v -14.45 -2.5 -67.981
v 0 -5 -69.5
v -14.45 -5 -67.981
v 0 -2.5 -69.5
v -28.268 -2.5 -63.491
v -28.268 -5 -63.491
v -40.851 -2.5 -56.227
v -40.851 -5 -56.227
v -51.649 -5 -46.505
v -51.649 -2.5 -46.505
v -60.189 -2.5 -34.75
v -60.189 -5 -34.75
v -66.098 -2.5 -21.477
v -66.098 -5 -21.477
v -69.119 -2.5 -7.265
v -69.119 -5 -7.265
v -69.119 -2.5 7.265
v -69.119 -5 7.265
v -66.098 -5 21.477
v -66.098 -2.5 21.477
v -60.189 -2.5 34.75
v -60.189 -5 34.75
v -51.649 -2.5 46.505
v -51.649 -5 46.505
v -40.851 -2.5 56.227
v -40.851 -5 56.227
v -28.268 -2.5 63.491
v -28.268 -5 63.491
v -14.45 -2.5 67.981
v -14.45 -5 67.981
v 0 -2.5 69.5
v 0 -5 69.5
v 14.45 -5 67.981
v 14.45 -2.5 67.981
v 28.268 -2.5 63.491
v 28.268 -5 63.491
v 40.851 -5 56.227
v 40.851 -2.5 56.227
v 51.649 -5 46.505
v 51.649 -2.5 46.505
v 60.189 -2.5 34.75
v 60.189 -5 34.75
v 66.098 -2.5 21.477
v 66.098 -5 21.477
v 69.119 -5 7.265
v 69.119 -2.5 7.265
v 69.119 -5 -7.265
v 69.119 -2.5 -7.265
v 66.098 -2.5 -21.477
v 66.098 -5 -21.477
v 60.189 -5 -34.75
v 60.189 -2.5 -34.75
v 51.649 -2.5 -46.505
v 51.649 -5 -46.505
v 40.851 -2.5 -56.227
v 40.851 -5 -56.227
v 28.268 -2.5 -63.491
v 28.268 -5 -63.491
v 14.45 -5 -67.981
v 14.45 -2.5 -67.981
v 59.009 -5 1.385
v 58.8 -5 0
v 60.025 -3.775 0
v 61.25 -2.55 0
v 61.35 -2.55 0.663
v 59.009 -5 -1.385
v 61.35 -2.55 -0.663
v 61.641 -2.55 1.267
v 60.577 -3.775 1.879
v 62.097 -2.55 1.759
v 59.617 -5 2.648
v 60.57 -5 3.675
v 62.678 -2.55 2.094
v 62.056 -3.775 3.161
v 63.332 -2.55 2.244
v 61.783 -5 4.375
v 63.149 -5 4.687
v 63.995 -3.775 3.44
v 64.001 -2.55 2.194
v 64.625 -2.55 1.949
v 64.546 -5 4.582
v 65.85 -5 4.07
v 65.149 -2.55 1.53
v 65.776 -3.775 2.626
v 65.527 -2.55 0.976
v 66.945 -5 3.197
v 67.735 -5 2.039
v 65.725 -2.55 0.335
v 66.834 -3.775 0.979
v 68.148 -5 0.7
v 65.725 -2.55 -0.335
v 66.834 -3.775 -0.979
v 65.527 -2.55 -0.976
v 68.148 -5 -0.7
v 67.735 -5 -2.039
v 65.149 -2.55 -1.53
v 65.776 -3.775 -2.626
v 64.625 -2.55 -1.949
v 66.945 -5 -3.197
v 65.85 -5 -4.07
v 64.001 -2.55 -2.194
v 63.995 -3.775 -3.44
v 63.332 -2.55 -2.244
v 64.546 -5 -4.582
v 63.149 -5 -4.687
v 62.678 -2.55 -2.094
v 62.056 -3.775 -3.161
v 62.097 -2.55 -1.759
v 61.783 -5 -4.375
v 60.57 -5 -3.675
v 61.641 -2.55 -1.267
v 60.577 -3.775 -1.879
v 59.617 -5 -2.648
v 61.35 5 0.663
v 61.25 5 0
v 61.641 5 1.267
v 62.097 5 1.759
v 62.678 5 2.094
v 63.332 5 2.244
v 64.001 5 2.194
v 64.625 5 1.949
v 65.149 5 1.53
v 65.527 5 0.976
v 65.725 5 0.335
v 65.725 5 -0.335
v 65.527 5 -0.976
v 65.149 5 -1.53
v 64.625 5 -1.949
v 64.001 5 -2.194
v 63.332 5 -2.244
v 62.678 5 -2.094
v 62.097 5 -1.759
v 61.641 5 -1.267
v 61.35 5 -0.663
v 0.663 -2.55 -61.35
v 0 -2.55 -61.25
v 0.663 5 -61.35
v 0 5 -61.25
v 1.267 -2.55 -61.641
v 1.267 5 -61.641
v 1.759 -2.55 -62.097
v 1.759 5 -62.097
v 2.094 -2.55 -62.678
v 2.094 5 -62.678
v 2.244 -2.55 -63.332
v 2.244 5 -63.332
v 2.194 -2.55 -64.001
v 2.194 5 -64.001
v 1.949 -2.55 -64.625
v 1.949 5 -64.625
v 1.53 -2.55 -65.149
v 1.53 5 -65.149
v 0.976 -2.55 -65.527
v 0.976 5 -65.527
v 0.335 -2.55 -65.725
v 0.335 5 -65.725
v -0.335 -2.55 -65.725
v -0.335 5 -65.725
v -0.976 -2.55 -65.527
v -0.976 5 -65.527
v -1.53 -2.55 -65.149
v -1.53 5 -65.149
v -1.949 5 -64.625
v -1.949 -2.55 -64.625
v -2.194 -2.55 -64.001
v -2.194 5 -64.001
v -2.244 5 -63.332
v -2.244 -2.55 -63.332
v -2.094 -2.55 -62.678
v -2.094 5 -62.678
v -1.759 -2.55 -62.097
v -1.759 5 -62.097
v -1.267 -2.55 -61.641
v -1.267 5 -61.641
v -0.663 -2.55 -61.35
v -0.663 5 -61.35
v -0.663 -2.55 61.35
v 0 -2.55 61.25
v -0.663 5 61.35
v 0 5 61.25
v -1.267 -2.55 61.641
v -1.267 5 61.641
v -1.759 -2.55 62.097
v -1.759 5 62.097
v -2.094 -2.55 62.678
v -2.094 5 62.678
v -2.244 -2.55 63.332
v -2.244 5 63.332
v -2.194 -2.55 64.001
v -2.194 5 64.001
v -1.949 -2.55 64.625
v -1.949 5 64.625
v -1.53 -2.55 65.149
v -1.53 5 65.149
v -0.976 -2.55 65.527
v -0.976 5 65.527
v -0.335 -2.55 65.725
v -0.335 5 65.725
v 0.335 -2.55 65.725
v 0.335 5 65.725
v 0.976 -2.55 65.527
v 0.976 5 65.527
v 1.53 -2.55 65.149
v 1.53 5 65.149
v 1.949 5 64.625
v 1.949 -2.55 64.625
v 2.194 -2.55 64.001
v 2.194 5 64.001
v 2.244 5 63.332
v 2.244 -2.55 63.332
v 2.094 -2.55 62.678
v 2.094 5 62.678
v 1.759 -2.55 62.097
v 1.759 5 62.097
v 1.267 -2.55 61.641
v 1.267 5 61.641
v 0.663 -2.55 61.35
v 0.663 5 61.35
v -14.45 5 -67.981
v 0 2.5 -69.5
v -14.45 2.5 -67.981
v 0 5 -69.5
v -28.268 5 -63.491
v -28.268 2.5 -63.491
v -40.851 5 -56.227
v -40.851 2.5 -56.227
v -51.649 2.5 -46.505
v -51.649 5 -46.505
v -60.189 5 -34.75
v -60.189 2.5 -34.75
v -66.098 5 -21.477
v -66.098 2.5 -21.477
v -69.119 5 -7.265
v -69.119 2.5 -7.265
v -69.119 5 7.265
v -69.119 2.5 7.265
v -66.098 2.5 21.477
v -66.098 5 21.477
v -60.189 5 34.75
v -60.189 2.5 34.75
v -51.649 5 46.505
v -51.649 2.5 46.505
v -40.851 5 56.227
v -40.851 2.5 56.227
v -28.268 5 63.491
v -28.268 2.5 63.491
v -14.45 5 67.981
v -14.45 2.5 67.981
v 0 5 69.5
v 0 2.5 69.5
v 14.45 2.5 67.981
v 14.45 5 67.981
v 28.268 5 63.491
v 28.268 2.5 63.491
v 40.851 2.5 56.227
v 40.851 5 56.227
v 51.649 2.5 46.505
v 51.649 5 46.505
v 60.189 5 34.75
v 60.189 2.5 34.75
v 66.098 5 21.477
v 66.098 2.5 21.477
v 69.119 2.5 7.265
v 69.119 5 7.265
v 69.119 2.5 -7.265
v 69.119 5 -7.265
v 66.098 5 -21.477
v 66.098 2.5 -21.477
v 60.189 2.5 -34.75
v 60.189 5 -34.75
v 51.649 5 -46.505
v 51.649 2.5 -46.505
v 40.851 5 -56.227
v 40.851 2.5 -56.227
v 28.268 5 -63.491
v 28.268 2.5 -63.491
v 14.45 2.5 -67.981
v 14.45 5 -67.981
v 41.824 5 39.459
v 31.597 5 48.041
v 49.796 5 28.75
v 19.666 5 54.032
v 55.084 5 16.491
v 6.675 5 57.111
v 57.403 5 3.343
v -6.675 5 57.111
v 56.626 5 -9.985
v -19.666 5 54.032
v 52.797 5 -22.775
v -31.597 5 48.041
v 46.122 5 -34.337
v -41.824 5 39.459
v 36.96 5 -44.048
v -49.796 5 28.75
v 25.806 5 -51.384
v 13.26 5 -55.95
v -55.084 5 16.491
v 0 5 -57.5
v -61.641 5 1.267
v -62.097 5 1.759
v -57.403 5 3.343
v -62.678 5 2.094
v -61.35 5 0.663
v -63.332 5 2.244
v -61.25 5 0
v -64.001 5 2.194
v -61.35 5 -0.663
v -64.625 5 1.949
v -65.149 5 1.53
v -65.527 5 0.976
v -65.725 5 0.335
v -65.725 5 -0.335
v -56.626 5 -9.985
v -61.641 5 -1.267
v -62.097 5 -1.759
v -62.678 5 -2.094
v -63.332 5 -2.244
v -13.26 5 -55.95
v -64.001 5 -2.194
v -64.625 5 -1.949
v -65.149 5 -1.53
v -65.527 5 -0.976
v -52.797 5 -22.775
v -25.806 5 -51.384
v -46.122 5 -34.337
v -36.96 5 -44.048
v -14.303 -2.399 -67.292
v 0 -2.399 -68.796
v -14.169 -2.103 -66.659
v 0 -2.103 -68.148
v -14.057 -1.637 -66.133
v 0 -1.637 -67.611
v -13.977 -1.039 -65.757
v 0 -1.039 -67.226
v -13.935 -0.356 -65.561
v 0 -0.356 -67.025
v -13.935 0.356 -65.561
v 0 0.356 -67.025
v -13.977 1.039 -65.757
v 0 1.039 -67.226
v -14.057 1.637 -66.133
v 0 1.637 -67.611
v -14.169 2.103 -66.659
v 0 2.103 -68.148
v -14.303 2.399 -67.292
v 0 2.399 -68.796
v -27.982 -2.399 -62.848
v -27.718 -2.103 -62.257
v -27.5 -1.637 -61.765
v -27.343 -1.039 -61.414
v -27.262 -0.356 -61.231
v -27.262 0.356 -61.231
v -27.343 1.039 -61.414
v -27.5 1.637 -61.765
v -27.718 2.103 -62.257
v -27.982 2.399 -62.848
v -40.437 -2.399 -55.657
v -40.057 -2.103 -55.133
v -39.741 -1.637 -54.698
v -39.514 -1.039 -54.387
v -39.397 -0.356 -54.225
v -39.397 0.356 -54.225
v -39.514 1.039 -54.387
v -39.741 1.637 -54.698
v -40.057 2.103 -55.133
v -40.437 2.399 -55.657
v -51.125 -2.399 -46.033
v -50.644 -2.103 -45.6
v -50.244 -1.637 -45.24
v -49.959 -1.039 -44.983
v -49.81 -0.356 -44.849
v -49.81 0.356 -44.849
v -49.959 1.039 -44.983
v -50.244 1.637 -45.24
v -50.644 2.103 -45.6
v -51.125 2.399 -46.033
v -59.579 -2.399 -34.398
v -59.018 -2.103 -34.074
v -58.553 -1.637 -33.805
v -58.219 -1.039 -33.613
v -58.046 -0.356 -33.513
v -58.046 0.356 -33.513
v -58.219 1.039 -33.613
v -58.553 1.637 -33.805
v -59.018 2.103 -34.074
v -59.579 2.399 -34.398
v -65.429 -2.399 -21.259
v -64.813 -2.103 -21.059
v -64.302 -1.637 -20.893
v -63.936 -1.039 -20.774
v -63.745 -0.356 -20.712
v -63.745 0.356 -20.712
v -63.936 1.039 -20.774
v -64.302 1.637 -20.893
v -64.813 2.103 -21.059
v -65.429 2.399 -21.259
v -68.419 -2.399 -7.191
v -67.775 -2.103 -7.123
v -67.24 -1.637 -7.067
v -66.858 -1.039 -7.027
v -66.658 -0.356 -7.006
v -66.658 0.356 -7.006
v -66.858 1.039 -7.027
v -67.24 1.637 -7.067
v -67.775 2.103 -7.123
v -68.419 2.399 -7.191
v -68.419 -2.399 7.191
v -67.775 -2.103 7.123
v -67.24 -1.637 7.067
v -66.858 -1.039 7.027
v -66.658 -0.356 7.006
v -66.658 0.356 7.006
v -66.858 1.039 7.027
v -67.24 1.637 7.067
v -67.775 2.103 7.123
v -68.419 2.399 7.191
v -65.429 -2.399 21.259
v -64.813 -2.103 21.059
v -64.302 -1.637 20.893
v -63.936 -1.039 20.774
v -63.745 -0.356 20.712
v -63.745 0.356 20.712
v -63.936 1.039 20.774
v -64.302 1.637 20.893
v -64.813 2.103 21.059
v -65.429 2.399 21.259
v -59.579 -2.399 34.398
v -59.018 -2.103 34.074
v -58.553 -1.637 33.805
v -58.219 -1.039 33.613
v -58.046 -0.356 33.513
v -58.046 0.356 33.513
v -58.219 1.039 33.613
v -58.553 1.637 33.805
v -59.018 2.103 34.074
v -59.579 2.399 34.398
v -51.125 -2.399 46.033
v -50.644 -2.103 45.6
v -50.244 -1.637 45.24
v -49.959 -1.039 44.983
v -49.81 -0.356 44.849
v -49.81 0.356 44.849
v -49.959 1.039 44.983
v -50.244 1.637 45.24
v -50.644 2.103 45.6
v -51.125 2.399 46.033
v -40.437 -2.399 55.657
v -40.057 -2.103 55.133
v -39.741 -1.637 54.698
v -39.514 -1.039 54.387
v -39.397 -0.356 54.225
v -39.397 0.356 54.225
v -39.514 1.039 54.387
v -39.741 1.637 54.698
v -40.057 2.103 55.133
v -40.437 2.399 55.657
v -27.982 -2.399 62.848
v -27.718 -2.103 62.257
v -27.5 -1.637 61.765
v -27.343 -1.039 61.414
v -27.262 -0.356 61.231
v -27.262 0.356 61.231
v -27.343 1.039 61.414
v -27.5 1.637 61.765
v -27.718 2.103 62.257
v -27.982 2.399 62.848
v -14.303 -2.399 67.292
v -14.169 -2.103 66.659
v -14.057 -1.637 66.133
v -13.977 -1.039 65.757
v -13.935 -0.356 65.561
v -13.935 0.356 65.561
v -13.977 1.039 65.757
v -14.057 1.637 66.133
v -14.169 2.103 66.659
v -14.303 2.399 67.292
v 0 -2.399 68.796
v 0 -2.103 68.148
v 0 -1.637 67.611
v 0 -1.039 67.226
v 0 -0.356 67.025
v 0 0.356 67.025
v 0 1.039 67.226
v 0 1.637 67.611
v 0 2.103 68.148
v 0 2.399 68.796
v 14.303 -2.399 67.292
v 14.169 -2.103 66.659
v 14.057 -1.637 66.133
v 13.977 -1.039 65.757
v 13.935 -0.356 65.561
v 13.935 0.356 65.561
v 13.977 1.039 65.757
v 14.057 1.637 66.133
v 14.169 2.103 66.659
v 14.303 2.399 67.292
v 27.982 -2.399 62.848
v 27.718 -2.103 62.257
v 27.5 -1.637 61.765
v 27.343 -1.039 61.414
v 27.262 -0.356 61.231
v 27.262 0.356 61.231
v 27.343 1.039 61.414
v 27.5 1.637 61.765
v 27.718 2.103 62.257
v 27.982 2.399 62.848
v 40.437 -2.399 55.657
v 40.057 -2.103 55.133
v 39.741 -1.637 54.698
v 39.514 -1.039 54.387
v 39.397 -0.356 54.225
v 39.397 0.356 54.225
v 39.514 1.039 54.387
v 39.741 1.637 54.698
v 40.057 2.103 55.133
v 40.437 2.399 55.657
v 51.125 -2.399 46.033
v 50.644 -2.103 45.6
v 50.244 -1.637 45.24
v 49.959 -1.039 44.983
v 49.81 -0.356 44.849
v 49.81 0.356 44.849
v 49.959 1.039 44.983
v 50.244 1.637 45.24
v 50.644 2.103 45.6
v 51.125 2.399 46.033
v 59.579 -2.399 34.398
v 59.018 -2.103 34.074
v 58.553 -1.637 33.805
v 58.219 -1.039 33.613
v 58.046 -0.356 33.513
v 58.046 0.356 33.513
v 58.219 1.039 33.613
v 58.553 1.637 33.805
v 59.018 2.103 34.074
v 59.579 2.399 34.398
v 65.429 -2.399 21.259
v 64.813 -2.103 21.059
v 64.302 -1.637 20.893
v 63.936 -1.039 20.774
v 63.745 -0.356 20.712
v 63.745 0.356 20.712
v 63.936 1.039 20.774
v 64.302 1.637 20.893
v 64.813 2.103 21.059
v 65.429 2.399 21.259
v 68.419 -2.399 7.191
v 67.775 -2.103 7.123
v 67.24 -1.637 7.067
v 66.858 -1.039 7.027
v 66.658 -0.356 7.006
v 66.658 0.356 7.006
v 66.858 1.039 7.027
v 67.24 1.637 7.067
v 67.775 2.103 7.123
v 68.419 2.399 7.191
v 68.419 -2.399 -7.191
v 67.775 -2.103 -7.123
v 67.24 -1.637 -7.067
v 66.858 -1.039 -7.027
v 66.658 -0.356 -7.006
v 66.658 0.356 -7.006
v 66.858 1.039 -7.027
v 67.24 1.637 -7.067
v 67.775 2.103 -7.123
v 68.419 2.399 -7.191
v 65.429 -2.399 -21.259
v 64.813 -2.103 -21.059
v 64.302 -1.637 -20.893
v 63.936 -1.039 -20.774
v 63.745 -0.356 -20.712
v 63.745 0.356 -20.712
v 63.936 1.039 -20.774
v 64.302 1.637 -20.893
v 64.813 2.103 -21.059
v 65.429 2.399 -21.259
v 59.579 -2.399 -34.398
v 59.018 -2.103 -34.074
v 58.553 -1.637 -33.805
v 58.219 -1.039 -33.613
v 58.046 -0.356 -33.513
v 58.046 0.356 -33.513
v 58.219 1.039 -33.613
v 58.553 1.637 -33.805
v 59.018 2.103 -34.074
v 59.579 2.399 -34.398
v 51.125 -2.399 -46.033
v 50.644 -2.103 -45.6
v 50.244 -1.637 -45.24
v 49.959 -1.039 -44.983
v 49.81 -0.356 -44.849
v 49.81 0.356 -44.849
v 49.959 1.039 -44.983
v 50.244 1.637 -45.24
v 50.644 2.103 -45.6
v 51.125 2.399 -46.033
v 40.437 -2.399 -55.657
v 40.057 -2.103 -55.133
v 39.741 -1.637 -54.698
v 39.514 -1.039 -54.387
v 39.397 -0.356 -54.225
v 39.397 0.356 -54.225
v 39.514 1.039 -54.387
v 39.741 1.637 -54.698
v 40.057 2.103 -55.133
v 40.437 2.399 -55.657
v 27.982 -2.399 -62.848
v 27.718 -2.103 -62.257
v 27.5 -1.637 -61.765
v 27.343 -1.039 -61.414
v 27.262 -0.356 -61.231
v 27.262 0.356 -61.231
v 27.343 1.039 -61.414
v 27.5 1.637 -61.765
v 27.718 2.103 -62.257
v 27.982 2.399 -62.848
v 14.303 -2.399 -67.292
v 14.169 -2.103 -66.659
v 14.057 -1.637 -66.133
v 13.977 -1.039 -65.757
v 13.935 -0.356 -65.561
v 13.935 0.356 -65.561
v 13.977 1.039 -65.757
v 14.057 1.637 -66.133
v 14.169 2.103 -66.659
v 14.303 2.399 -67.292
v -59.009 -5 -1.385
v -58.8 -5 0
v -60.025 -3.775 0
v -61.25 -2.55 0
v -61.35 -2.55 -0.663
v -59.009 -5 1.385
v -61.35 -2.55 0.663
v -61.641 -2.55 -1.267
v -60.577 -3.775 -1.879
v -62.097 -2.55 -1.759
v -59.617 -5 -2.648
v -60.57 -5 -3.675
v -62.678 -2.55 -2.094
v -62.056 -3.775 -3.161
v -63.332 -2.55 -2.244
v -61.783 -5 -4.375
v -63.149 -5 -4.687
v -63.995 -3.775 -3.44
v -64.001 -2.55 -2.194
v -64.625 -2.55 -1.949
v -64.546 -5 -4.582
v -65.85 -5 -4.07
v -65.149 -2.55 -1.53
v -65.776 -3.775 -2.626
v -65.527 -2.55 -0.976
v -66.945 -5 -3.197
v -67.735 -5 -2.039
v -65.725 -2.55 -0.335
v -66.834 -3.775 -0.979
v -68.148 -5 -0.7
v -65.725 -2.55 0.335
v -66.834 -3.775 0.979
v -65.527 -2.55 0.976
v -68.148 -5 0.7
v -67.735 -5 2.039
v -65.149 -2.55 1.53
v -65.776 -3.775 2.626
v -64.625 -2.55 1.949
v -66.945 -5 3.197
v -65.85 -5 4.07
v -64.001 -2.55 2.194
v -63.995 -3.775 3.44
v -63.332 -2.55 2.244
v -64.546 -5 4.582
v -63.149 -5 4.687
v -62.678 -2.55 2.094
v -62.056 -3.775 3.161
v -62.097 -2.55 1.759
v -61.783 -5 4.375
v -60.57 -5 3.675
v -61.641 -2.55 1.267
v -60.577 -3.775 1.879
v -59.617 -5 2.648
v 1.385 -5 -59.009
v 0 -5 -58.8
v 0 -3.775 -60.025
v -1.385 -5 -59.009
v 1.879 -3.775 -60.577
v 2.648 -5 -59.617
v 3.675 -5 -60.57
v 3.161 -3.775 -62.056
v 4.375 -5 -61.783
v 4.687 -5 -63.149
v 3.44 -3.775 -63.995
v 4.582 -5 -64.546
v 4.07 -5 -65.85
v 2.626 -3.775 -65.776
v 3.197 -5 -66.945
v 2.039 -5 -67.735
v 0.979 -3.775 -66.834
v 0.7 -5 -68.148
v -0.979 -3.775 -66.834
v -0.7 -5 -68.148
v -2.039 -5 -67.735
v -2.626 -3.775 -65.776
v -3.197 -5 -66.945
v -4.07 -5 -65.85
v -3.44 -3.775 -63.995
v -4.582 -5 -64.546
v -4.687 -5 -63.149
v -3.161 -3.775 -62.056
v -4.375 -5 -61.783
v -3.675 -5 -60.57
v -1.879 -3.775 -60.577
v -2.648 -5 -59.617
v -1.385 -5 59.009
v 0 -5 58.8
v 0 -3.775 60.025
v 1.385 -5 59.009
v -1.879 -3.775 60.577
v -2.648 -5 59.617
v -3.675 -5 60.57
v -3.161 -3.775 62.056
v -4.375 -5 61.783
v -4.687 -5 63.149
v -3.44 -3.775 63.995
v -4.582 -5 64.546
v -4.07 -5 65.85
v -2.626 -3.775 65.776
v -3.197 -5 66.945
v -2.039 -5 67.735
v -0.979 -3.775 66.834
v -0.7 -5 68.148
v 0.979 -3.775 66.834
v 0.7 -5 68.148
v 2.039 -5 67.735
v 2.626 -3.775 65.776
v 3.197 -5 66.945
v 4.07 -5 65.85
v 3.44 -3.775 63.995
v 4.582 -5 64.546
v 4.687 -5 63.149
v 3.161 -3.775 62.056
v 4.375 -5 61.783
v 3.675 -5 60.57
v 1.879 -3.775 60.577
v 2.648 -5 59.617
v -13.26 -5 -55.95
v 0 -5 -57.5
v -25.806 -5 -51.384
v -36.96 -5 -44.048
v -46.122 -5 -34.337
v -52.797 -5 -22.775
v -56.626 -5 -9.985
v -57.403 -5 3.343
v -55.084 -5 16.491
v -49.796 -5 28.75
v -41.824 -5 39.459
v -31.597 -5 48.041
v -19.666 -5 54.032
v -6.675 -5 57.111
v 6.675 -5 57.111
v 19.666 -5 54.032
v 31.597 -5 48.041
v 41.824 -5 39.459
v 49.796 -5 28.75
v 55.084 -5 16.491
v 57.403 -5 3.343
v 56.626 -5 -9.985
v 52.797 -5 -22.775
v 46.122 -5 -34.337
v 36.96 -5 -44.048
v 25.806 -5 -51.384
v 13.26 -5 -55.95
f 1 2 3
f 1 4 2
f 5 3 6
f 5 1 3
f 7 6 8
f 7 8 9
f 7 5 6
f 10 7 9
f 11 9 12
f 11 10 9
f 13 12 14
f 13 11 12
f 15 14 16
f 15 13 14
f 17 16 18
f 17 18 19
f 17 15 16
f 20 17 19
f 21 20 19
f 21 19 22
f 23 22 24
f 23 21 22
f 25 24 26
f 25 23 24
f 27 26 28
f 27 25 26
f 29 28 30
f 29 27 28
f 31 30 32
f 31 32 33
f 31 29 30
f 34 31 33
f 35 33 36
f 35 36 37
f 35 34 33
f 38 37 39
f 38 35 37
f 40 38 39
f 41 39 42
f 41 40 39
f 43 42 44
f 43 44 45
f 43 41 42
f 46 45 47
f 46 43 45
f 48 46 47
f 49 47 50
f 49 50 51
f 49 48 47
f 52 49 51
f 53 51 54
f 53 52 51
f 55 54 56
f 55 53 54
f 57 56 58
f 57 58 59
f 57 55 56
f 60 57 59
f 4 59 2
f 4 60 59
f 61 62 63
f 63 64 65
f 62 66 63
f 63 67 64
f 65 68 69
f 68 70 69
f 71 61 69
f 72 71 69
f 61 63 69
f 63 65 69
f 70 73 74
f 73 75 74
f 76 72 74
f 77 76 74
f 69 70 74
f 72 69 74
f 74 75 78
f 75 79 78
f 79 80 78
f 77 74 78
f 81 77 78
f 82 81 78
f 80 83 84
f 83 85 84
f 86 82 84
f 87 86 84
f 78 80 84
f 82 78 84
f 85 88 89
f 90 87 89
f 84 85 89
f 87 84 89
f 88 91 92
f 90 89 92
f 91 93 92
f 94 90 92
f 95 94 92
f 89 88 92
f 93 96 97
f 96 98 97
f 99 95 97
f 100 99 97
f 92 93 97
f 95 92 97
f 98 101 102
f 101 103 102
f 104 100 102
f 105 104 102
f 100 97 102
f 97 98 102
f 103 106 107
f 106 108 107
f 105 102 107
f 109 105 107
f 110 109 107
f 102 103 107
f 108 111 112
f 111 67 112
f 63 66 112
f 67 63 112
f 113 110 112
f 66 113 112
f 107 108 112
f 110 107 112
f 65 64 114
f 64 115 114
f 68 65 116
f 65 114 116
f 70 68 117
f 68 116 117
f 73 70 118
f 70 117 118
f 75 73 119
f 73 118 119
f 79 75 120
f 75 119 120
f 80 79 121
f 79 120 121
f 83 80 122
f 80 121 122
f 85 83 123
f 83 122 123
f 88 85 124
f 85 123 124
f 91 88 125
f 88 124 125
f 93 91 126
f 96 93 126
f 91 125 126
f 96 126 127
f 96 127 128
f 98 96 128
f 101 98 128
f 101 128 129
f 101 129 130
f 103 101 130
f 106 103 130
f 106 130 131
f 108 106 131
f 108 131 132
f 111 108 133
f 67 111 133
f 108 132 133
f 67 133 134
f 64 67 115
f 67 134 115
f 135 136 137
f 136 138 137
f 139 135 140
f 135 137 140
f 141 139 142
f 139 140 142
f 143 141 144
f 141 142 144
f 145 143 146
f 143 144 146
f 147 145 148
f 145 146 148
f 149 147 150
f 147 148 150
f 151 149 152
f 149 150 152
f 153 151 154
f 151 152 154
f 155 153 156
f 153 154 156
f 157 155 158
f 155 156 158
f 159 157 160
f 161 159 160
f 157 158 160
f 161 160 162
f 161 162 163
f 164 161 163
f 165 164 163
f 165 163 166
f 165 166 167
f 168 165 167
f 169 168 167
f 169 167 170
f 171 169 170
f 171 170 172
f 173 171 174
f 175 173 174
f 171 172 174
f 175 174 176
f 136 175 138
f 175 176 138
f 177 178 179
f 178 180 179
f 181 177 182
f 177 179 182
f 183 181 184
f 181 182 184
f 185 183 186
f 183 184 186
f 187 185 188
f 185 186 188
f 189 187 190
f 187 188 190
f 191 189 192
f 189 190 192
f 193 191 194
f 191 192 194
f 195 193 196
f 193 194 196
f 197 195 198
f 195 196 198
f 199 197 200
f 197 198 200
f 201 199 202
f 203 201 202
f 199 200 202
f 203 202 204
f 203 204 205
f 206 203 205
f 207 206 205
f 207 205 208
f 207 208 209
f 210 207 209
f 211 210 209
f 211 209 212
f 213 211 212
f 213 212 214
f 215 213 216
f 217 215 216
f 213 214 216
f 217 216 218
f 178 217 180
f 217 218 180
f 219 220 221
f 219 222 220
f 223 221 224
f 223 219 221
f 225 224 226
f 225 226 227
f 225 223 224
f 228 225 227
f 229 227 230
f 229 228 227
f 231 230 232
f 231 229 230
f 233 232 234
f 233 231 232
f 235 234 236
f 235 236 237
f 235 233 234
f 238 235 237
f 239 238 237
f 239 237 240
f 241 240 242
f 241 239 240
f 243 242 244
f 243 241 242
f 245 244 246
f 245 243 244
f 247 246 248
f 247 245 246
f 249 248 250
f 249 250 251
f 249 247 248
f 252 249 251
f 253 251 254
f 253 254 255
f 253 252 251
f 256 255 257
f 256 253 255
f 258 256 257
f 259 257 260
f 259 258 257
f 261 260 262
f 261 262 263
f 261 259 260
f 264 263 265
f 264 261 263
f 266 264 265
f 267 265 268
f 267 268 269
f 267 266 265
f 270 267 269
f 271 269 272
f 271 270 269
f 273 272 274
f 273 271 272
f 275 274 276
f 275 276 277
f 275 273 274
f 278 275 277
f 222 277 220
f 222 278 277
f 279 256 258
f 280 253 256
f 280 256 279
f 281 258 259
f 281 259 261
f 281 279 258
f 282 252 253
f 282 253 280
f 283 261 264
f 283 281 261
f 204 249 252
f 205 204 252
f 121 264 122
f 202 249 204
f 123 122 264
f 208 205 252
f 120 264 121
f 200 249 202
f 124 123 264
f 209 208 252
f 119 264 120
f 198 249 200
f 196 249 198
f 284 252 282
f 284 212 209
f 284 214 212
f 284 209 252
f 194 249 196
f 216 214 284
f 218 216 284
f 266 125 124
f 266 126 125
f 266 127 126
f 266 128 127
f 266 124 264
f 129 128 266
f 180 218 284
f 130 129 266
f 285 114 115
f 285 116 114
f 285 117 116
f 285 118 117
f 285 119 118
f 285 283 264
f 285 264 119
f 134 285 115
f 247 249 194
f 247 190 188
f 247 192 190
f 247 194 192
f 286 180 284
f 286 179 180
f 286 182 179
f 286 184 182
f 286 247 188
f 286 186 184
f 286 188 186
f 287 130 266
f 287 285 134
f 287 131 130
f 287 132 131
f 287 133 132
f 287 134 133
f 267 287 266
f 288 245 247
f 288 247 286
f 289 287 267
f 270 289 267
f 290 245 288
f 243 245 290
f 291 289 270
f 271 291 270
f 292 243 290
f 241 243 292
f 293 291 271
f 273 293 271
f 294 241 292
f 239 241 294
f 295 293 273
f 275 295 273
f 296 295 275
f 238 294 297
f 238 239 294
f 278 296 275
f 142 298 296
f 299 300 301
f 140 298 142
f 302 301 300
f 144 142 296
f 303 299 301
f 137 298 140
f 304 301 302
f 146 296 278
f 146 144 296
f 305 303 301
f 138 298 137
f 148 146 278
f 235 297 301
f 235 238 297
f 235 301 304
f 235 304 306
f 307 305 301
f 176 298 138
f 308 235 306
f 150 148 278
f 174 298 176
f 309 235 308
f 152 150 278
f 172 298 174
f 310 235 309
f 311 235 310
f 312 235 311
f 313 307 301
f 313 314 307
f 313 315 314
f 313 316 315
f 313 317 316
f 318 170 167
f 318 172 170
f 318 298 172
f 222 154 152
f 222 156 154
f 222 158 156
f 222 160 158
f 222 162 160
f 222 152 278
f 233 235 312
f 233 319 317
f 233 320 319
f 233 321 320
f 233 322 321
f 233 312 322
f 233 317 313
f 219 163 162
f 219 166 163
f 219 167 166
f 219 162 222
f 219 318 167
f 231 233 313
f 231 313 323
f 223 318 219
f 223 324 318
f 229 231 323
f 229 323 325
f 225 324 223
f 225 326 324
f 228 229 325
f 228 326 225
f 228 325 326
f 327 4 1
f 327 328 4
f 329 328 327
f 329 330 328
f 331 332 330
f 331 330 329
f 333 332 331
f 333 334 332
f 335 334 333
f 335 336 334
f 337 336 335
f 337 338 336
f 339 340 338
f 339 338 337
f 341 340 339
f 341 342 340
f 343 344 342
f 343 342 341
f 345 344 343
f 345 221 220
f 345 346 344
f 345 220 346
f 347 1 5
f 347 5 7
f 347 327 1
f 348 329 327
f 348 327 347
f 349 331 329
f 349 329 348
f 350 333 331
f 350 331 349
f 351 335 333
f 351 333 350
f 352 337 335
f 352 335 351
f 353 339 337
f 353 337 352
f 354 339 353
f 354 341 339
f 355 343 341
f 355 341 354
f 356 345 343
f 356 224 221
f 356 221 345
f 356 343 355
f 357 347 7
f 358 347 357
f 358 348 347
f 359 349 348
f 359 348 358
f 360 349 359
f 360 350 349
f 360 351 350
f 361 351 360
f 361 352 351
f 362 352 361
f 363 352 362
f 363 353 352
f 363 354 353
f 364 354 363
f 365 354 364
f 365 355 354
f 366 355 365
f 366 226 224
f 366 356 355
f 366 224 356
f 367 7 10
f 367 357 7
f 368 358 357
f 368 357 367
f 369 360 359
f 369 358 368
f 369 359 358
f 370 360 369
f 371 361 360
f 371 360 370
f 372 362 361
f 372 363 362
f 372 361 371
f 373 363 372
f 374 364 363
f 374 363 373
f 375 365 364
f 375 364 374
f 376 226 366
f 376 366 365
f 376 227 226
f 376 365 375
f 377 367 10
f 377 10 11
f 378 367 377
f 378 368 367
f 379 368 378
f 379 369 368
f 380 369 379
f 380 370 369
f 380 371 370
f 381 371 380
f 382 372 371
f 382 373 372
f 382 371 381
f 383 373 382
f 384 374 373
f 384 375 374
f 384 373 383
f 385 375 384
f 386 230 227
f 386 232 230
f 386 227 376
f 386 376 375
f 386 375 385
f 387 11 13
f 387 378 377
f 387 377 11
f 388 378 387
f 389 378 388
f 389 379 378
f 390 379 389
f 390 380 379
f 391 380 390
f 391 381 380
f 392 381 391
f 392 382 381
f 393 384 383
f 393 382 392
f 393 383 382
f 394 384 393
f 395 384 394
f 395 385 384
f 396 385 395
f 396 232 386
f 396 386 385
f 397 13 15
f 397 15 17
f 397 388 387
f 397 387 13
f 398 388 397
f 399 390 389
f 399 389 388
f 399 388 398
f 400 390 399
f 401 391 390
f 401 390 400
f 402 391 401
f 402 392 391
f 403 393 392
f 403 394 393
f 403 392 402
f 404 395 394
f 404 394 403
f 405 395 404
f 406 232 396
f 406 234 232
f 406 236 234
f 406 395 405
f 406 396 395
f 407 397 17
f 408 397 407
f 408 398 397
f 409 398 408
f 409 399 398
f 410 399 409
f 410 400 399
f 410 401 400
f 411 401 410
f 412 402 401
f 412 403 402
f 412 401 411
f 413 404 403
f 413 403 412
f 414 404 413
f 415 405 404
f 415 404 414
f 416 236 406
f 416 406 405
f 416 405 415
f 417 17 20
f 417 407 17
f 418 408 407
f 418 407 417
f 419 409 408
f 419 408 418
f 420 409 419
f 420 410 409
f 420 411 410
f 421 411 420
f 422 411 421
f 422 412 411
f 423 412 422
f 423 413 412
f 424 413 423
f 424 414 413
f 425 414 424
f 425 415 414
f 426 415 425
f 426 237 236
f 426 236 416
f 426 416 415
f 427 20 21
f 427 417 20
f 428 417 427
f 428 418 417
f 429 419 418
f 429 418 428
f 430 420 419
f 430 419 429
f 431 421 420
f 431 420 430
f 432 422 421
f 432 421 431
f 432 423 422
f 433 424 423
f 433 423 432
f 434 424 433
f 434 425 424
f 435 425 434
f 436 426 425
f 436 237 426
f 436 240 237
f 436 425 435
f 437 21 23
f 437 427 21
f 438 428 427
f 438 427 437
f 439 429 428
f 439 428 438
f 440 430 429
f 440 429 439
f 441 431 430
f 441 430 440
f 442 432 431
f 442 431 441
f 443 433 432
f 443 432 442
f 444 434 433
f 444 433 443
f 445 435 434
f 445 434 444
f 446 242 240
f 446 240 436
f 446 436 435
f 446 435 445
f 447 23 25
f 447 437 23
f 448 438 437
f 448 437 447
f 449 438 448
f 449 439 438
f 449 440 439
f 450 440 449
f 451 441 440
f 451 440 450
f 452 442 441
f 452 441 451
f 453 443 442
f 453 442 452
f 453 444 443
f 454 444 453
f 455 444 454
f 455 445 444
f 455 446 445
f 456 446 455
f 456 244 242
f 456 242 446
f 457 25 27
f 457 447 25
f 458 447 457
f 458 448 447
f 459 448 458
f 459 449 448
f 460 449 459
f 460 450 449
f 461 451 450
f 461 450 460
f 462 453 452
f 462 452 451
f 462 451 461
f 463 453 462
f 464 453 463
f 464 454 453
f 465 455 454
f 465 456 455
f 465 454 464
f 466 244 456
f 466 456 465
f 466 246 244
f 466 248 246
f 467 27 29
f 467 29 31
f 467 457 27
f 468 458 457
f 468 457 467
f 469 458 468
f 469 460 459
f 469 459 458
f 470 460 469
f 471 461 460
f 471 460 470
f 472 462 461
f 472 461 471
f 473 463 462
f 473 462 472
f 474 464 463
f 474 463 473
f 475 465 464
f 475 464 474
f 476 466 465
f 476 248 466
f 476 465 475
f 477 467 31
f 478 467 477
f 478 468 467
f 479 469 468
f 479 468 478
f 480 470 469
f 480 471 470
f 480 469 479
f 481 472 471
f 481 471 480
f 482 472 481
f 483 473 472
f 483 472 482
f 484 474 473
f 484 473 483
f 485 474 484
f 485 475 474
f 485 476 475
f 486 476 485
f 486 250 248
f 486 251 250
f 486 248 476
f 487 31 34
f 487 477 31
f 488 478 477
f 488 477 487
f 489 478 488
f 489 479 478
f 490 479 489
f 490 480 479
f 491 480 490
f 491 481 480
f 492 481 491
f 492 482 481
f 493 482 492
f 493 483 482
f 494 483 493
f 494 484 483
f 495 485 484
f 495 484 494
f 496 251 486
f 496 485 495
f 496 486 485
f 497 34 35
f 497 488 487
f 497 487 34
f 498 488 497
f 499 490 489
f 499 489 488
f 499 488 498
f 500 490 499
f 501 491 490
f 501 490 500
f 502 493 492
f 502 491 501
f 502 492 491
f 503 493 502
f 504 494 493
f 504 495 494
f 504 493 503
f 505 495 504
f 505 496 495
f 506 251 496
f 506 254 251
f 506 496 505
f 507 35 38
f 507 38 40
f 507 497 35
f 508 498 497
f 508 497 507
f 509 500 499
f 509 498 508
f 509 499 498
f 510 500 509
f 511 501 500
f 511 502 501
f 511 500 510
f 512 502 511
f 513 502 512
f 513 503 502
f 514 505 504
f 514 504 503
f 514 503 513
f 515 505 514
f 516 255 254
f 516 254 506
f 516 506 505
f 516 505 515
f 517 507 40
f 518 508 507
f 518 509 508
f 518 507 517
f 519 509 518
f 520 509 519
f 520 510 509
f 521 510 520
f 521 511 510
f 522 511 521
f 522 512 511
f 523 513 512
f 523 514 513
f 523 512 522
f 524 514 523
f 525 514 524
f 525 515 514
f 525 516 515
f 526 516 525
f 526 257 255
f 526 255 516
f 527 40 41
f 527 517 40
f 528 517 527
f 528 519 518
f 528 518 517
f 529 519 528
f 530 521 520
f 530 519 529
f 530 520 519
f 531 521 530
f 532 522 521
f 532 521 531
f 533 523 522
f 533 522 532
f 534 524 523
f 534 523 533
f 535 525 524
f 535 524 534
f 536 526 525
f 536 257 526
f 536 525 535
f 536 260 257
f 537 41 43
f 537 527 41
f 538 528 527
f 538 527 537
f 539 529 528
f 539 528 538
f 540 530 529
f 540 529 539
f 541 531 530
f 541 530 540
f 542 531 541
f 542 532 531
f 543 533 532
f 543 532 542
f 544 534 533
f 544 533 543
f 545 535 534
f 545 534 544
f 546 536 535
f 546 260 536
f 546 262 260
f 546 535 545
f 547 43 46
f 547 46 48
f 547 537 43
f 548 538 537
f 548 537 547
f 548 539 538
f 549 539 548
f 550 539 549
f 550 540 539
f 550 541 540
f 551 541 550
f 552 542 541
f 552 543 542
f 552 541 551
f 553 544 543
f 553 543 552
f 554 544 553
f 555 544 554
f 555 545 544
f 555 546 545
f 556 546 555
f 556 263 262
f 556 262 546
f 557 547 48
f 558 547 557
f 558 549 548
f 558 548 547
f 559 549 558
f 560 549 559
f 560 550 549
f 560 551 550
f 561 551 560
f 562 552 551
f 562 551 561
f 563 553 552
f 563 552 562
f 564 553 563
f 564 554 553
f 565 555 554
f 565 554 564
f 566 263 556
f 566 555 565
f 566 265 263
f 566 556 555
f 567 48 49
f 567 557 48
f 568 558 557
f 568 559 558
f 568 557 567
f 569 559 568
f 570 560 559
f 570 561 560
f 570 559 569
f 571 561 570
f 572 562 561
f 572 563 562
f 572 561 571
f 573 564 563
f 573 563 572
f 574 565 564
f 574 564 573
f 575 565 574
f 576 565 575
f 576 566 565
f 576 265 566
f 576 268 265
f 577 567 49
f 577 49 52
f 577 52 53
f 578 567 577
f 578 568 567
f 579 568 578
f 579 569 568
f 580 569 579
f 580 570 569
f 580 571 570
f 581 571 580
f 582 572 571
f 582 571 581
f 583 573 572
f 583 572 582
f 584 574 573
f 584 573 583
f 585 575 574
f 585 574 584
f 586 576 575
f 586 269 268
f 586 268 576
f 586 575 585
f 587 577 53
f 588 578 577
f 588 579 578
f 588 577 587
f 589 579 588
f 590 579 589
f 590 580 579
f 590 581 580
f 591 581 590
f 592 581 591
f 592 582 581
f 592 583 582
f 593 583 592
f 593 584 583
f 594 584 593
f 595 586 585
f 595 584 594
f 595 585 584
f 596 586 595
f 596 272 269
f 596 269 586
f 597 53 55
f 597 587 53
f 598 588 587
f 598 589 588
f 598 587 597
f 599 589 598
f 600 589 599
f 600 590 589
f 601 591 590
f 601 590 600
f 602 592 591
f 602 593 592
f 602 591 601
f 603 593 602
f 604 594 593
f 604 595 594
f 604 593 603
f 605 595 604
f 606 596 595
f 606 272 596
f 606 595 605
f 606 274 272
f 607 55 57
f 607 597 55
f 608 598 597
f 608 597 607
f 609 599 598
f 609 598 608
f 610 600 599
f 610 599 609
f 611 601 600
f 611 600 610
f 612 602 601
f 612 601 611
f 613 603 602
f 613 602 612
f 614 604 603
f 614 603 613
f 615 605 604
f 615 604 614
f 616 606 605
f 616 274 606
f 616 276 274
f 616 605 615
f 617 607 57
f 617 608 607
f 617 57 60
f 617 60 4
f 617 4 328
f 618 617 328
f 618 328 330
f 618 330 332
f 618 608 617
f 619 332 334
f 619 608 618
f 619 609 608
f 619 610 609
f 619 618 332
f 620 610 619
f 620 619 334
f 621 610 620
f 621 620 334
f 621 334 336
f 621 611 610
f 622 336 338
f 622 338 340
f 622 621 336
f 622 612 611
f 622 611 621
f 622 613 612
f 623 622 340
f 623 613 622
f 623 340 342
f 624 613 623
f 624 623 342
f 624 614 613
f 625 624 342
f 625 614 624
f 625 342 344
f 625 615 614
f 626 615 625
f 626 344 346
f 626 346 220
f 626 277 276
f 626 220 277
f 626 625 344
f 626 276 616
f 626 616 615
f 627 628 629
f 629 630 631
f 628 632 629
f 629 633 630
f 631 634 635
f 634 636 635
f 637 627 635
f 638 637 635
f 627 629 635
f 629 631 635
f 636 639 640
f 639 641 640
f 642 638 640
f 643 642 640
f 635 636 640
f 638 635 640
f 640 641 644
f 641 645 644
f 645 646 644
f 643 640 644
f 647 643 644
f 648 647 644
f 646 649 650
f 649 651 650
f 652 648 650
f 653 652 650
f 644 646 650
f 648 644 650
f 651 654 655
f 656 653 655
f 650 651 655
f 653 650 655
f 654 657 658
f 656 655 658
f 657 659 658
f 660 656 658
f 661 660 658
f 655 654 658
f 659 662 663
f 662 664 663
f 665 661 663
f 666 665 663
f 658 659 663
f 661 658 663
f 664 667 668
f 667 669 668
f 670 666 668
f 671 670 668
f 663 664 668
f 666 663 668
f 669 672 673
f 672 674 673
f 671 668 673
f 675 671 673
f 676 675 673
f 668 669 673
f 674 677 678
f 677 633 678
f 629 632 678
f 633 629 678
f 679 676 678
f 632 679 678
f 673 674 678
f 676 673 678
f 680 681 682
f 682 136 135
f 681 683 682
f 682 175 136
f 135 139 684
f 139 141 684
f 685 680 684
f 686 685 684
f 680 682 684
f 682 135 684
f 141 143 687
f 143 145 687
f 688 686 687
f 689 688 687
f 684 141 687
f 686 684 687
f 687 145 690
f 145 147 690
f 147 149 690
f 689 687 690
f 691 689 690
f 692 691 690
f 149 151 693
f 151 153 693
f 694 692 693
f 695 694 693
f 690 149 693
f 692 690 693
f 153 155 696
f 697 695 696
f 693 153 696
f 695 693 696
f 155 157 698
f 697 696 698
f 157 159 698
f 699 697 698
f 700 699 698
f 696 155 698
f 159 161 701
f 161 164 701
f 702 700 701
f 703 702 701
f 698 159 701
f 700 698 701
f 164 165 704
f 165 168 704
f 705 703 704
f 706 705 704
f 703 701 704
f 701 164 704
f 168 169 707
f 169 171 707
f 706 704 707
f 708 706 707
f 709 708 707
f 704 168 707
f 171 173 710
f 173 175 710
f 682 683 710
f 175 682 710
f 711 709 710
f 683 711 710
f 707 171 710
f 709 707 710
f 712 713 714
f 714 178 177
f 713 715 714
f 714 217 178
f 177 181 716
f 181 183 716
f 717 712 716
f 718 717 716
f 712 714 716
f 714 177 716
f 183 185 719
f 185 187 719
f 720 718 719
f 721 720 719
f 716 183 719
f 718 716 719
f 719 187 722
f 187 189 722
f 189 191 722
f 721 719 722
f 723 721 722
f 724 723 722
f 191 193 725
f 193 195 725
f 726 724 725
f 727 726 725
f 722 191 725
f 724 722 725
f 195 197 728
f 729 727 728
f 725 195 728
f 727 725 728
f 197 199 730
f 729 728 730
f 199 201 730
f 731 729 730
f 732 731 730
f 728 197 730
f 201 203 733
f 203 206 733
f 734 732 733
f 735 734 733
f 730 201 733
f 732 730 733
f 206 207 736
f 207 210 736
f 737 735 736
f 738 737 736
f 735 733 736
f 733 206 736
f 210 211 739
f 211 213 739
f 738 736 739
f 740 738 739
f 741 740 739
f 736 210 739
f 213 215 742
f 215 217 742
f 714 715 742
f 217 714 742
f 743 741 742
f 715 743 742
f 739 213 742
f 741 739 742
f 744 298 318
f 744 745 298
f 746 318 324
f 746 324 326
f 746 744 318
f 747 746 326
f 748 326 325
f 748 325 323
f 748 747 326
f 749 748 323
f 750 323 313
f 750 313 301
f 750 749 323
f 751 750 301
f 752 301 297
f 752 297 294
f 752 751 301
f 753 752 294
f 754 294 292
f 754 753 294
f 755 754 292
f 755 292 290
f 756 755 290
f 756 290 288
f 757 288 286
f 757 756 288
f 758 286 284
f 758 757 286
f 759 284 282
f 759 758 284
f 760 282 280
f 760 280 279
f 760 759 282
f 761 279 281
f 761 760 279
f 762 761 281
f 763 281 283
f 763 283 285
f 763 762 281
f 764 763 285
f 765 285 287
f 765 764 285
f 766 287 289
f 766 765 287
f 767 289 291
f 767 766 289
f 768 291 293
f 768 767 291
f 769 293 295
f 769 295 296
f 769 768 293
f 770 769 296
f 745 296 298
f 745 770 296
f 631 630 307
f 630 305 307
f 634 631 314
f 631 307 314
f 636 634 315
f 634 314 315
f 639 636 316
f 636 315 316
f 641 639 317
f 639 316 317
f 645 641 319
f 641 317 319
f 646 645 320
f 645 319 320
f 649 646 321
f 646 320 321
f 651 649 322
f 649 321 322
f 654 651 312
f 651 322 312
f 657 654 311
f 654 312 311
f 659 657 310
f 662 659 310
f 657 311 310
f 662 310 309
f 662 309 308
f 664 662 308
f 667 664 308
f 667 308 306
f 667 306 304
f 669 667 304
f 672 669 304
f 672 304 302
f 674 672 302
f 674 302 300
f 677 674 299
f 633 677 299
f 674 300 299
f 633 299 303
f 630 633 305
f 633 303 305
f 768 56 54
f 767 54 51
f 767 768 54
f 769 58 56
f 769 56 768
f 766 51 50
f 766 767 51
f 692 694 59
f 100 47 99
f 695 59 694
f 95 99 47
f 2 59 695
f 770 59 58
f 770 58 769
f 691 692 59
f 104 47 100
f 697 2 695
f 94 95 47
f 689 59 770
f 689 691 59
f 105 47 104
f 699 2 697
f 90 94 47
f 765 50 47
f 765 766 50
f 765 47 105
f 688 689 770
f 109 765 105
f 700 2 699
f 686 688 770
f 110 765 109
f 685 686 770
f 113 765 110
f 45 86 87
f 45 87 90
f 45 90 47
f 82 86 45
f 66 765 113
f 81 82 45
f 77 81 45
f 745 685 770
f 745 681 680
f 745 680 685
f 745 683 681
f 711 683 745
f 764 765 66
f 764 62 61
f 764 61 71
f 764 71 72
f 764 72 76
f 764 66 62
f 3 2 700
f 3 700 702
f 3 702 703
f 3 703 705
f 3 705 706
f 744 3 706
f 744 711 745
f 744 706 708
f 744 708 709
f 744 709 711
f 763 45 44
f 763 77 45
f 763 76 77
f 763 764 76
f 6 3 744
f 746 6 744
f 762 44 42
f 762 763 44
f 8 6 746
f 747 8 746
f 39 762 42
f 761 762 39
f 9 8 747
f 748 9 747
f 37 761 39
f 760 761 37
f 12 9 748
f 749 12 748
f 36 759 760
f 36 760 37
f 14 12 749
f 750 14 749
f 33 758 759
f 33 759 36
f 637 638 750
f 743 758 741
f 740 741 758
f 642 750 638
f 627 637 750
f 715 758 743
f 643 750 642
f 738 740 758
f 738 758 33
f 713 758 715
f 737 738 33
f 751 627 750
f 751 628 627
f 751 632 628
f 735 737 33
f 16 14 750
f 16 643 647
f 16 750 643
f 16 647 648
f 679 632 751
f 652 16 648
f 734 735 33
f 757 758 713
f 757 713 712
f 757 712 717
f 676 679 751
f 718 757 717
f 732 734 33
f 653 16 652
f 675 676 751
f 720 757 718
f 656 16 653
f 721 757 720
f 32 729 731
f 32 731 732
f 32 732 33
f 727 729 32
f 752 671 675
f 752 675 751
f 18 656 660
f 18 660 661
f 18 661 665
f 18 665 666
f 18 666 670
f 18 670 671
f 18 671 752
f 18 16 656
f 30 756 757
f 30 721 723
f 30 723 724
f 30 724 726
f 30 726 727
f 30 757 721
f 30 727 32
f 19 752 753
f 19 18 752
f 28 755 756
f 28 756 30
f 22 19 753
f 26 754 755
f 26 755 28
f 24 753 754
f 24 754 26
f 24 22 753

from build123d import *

# Parameters (mm, degrees)
CSK_FOR_M4_COUNTERSUNK_FLAT_HEAD_SCREW1_D           = 4.5
CSK_FOR_M4_COUNTERSUNK_FLAT_HEAD_SCREW1_CSINK_D     = 9.4
CSK_FOR_M4_COUNTERSUNK_FLAT_HEAD_SCREW1_CSINK_ANGLE = 90
CIRPATTERN1_COUNT                                   = 4


with BuildPart() as part:
    # Sketch1 → Revolve1 (revolve)
    with BuildSketch(Plane.XY, mode=Mode.PRIVATE) as revolve1_sk:
        with BuildLine():
            Line((-57.5, 5), (-57.5, -5))
            Line((-57.5, -5), (-69.5, -5))
            Line((-69.5, -5), (-69.5, -2.5))
            ThreePointArc((-69.5, -2.5), (-67, 0), (-69.5, 2.5))
            Line((-69.5, 2.5), (-69.5, 5))
            Line((-69.5, 5), (-57.5, 5))
        make_face()
    revolve(revolve1_sk.sketch.rotate(Axis((0, -5.61, 0), (0, 1, 0)), 270), axis=Axis((0, -5.61, 0), (0, 1, 0)))

    # CSK for M4 Countersunk Flat Head Screw1 (through all)
    with Locations(Plane(origin=(0, -5, 0), x_dir=(-1, 0, 0), z_dir=(0, -1, 0))):
        with Locations((63.5, 0)):
            csk_for_m4_countersunk_flat_head_screw1 = CounterSinkHole(CSK_FOR_M4_COUNTERSUNK_FLAT_HEAD_SCREW1_D / 2, CSK_FOR_M4_COUNTERSUNK_FLAT_HEAD_SCREW1_CSINK_D / 2, counter_sink_angle=CSK_FOR_M4_COUNTERSUNK_FLAT_HEAD_SCREW1_CSINK_ANGLE)

    # CirPattern1: CSK for M4 Countersunk Flat Head Screw1 ×4 about axis
    cirpattern1_axis = Axis((0, 0, 0), (0, 1, 0))
    for i in range(1, CIRPATTERN1_COUNT):
        add(csk_for_m4_countersunk_flat_head_screw1.rotate(cirpattern1_axis, i * 360 / CIRPATTERN1_COUNT), mode=Mode.SUBTRACT)


solid = part.part
